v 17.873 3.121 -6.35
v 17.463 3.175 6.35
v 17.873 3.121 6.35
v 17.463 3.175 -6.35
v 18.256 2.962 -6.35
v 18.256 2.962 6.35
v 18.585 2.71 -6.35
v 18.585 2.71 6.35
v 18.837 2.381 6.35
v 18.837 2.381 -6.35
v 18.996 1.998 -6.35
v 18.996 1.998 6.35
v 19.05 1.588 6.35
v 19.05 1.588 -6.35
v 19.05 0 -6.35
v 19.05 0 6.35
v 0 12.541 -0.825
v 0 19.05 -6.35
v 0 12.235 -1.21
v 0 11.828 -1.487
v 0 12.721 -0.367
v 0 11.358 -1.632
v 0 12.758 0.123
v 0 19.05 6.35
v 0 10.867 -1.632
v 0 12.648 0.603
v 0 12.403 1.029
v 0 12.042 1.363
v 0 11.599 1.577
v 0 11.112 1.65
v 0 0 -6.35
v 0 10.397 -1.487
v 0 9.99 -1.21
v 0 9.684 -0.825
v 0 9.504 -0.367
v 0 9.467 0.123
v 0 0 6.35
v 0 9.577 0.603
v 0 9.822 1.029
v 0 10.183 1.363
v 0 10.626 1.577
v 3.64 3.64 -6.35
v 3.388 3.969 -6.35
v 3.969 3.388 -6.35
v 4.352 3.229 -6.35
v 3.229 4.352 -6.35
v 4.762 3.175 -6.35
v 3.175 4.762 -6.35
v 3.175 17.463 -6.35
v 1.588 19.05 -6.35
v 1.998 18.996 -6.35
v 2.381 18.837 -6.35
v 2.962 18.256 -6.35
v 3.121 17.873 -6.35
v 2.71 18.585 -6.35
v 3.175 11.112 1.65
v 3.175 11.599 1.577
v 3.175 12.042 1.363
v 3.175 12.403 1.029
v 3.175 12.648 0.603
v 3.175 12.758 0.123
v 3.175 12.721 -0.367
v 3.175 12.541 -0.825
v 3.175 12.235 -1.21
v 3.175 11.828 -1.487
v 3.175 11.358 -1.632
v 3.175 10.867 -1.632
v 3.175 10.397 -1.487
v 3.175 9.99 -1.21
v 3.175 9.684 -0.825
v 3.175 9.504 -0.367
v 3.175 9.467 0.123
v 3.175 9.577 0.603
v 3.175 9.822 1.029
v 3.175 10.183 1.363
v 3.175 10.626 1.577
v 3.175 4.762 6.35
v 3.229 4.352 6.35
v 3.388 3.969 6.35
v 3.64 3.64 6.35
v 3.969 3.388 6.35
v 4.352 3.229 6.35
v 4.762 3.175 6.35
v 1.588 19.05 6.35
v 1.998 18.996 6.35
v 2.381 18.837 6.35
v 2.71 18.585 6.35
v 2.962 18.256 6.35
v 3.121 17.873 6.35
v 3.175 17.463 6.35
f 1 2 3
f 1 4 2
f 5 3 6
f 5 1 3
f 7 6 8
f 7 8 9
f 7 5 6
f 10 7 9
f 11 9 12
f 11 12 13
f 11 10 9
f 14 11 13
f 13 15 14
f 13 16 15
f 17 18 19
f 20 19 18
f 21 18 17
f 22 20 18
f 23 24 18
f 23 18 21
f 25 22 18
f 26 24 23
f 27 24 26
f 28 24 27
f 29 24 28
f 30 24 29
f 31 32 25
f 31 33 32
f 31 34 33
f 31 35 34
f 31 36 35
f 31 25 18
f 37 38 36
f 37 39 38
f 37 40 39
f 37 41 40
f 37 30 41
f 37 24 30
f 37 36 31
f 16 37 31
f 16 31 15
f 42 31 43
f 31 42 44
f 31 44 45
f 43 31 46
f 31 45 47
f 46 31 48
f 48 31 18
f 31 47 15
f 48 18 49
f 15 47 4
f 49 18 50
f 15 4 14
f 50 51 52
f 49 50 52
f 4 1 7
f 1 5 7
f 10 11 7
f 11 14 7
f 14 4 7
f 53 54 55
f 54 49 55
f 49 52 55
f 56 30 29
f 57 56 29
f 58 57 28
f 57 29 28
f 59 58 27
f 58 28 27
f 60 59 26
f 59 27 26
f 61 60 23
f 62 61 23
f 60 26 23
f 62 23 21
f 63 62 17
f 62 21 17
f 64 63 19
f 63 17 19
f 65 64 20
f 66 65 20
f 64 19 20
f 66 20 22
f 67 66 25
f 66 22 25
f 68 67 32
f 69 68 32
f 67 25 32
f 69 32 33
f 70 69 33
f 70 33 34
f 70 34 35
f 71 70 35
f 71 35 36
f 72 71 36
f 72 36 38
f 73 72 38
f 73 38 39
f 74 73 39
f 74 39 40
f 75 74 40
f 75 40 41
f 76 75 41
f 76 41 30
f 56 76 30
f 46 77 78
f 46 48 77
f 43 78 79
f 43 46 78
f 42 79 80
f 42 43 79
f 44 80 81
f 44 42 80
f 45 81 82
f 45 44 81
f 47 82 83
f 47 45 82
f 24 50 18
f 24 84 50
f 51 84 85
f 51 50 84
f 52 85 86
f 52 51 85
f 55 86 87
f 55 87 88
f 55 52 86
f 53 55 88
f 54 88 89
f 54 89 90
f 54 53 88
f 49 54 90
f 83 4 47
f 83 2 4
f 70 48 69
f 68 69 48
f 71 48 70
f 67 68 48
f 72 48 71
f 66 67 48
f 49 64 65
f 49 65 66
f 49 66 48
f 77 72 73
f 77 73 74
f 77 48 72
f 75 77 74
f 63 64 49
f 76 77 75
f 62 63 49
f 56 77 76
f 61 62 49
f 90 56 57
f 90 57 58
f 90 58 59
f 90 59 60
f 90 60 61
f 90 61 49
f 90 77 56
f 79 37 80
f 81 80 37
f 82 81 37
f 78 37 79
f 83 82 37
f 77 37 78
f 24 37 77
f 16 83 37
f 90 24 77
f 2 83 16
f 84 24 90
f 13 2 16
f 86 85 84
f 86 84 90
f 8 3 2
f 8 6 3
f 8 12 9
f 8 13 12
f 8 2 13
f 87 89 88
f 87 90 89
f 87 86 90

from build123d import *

# Parameters (mm, degrees)
BOSS_EXTRUDE1_DEPTH   = 6.35
FILLET1_R             = 1.5875
M4X0_7_TAPPED_HOLE1_D = 3.3


with BuildPart() as part:
    # Sketch3 → Boss-Extrude1 (new, symmetric)
    with BuildSketch(Plane.XY):
        Polygon((3.175, 19.05), (0, 19.05), (0, 0), (19.05, 0), (19.05, 3.175), (3.175, 3.175), align=None)
    extrude(amount=BOSS_EXTRUDE1_DEPTH, both=True)

    # Fillet1
    fillet1_edges = [part.edges().sort_by_distance(p)[0] for p in [
        (3.175, 3.175, 0),
        (19.05, 3.175, 0),
        (3.175, 19.05, 0),
    ]]
    fillet(fillet1_edges, radius=FILLET1_R)

    # M4x0.7 Tapped Hole1 (through all)
    with Locations(Plane(origin=(3.175, 0, 0), x_dir=(0, 0, -1), z_dir=(1, 0, 0))):
        with Locations((0, 11.1125)):
            Hole(M4X0_7_TAPPED_HOLE1_D / 2)


solid = part.part
